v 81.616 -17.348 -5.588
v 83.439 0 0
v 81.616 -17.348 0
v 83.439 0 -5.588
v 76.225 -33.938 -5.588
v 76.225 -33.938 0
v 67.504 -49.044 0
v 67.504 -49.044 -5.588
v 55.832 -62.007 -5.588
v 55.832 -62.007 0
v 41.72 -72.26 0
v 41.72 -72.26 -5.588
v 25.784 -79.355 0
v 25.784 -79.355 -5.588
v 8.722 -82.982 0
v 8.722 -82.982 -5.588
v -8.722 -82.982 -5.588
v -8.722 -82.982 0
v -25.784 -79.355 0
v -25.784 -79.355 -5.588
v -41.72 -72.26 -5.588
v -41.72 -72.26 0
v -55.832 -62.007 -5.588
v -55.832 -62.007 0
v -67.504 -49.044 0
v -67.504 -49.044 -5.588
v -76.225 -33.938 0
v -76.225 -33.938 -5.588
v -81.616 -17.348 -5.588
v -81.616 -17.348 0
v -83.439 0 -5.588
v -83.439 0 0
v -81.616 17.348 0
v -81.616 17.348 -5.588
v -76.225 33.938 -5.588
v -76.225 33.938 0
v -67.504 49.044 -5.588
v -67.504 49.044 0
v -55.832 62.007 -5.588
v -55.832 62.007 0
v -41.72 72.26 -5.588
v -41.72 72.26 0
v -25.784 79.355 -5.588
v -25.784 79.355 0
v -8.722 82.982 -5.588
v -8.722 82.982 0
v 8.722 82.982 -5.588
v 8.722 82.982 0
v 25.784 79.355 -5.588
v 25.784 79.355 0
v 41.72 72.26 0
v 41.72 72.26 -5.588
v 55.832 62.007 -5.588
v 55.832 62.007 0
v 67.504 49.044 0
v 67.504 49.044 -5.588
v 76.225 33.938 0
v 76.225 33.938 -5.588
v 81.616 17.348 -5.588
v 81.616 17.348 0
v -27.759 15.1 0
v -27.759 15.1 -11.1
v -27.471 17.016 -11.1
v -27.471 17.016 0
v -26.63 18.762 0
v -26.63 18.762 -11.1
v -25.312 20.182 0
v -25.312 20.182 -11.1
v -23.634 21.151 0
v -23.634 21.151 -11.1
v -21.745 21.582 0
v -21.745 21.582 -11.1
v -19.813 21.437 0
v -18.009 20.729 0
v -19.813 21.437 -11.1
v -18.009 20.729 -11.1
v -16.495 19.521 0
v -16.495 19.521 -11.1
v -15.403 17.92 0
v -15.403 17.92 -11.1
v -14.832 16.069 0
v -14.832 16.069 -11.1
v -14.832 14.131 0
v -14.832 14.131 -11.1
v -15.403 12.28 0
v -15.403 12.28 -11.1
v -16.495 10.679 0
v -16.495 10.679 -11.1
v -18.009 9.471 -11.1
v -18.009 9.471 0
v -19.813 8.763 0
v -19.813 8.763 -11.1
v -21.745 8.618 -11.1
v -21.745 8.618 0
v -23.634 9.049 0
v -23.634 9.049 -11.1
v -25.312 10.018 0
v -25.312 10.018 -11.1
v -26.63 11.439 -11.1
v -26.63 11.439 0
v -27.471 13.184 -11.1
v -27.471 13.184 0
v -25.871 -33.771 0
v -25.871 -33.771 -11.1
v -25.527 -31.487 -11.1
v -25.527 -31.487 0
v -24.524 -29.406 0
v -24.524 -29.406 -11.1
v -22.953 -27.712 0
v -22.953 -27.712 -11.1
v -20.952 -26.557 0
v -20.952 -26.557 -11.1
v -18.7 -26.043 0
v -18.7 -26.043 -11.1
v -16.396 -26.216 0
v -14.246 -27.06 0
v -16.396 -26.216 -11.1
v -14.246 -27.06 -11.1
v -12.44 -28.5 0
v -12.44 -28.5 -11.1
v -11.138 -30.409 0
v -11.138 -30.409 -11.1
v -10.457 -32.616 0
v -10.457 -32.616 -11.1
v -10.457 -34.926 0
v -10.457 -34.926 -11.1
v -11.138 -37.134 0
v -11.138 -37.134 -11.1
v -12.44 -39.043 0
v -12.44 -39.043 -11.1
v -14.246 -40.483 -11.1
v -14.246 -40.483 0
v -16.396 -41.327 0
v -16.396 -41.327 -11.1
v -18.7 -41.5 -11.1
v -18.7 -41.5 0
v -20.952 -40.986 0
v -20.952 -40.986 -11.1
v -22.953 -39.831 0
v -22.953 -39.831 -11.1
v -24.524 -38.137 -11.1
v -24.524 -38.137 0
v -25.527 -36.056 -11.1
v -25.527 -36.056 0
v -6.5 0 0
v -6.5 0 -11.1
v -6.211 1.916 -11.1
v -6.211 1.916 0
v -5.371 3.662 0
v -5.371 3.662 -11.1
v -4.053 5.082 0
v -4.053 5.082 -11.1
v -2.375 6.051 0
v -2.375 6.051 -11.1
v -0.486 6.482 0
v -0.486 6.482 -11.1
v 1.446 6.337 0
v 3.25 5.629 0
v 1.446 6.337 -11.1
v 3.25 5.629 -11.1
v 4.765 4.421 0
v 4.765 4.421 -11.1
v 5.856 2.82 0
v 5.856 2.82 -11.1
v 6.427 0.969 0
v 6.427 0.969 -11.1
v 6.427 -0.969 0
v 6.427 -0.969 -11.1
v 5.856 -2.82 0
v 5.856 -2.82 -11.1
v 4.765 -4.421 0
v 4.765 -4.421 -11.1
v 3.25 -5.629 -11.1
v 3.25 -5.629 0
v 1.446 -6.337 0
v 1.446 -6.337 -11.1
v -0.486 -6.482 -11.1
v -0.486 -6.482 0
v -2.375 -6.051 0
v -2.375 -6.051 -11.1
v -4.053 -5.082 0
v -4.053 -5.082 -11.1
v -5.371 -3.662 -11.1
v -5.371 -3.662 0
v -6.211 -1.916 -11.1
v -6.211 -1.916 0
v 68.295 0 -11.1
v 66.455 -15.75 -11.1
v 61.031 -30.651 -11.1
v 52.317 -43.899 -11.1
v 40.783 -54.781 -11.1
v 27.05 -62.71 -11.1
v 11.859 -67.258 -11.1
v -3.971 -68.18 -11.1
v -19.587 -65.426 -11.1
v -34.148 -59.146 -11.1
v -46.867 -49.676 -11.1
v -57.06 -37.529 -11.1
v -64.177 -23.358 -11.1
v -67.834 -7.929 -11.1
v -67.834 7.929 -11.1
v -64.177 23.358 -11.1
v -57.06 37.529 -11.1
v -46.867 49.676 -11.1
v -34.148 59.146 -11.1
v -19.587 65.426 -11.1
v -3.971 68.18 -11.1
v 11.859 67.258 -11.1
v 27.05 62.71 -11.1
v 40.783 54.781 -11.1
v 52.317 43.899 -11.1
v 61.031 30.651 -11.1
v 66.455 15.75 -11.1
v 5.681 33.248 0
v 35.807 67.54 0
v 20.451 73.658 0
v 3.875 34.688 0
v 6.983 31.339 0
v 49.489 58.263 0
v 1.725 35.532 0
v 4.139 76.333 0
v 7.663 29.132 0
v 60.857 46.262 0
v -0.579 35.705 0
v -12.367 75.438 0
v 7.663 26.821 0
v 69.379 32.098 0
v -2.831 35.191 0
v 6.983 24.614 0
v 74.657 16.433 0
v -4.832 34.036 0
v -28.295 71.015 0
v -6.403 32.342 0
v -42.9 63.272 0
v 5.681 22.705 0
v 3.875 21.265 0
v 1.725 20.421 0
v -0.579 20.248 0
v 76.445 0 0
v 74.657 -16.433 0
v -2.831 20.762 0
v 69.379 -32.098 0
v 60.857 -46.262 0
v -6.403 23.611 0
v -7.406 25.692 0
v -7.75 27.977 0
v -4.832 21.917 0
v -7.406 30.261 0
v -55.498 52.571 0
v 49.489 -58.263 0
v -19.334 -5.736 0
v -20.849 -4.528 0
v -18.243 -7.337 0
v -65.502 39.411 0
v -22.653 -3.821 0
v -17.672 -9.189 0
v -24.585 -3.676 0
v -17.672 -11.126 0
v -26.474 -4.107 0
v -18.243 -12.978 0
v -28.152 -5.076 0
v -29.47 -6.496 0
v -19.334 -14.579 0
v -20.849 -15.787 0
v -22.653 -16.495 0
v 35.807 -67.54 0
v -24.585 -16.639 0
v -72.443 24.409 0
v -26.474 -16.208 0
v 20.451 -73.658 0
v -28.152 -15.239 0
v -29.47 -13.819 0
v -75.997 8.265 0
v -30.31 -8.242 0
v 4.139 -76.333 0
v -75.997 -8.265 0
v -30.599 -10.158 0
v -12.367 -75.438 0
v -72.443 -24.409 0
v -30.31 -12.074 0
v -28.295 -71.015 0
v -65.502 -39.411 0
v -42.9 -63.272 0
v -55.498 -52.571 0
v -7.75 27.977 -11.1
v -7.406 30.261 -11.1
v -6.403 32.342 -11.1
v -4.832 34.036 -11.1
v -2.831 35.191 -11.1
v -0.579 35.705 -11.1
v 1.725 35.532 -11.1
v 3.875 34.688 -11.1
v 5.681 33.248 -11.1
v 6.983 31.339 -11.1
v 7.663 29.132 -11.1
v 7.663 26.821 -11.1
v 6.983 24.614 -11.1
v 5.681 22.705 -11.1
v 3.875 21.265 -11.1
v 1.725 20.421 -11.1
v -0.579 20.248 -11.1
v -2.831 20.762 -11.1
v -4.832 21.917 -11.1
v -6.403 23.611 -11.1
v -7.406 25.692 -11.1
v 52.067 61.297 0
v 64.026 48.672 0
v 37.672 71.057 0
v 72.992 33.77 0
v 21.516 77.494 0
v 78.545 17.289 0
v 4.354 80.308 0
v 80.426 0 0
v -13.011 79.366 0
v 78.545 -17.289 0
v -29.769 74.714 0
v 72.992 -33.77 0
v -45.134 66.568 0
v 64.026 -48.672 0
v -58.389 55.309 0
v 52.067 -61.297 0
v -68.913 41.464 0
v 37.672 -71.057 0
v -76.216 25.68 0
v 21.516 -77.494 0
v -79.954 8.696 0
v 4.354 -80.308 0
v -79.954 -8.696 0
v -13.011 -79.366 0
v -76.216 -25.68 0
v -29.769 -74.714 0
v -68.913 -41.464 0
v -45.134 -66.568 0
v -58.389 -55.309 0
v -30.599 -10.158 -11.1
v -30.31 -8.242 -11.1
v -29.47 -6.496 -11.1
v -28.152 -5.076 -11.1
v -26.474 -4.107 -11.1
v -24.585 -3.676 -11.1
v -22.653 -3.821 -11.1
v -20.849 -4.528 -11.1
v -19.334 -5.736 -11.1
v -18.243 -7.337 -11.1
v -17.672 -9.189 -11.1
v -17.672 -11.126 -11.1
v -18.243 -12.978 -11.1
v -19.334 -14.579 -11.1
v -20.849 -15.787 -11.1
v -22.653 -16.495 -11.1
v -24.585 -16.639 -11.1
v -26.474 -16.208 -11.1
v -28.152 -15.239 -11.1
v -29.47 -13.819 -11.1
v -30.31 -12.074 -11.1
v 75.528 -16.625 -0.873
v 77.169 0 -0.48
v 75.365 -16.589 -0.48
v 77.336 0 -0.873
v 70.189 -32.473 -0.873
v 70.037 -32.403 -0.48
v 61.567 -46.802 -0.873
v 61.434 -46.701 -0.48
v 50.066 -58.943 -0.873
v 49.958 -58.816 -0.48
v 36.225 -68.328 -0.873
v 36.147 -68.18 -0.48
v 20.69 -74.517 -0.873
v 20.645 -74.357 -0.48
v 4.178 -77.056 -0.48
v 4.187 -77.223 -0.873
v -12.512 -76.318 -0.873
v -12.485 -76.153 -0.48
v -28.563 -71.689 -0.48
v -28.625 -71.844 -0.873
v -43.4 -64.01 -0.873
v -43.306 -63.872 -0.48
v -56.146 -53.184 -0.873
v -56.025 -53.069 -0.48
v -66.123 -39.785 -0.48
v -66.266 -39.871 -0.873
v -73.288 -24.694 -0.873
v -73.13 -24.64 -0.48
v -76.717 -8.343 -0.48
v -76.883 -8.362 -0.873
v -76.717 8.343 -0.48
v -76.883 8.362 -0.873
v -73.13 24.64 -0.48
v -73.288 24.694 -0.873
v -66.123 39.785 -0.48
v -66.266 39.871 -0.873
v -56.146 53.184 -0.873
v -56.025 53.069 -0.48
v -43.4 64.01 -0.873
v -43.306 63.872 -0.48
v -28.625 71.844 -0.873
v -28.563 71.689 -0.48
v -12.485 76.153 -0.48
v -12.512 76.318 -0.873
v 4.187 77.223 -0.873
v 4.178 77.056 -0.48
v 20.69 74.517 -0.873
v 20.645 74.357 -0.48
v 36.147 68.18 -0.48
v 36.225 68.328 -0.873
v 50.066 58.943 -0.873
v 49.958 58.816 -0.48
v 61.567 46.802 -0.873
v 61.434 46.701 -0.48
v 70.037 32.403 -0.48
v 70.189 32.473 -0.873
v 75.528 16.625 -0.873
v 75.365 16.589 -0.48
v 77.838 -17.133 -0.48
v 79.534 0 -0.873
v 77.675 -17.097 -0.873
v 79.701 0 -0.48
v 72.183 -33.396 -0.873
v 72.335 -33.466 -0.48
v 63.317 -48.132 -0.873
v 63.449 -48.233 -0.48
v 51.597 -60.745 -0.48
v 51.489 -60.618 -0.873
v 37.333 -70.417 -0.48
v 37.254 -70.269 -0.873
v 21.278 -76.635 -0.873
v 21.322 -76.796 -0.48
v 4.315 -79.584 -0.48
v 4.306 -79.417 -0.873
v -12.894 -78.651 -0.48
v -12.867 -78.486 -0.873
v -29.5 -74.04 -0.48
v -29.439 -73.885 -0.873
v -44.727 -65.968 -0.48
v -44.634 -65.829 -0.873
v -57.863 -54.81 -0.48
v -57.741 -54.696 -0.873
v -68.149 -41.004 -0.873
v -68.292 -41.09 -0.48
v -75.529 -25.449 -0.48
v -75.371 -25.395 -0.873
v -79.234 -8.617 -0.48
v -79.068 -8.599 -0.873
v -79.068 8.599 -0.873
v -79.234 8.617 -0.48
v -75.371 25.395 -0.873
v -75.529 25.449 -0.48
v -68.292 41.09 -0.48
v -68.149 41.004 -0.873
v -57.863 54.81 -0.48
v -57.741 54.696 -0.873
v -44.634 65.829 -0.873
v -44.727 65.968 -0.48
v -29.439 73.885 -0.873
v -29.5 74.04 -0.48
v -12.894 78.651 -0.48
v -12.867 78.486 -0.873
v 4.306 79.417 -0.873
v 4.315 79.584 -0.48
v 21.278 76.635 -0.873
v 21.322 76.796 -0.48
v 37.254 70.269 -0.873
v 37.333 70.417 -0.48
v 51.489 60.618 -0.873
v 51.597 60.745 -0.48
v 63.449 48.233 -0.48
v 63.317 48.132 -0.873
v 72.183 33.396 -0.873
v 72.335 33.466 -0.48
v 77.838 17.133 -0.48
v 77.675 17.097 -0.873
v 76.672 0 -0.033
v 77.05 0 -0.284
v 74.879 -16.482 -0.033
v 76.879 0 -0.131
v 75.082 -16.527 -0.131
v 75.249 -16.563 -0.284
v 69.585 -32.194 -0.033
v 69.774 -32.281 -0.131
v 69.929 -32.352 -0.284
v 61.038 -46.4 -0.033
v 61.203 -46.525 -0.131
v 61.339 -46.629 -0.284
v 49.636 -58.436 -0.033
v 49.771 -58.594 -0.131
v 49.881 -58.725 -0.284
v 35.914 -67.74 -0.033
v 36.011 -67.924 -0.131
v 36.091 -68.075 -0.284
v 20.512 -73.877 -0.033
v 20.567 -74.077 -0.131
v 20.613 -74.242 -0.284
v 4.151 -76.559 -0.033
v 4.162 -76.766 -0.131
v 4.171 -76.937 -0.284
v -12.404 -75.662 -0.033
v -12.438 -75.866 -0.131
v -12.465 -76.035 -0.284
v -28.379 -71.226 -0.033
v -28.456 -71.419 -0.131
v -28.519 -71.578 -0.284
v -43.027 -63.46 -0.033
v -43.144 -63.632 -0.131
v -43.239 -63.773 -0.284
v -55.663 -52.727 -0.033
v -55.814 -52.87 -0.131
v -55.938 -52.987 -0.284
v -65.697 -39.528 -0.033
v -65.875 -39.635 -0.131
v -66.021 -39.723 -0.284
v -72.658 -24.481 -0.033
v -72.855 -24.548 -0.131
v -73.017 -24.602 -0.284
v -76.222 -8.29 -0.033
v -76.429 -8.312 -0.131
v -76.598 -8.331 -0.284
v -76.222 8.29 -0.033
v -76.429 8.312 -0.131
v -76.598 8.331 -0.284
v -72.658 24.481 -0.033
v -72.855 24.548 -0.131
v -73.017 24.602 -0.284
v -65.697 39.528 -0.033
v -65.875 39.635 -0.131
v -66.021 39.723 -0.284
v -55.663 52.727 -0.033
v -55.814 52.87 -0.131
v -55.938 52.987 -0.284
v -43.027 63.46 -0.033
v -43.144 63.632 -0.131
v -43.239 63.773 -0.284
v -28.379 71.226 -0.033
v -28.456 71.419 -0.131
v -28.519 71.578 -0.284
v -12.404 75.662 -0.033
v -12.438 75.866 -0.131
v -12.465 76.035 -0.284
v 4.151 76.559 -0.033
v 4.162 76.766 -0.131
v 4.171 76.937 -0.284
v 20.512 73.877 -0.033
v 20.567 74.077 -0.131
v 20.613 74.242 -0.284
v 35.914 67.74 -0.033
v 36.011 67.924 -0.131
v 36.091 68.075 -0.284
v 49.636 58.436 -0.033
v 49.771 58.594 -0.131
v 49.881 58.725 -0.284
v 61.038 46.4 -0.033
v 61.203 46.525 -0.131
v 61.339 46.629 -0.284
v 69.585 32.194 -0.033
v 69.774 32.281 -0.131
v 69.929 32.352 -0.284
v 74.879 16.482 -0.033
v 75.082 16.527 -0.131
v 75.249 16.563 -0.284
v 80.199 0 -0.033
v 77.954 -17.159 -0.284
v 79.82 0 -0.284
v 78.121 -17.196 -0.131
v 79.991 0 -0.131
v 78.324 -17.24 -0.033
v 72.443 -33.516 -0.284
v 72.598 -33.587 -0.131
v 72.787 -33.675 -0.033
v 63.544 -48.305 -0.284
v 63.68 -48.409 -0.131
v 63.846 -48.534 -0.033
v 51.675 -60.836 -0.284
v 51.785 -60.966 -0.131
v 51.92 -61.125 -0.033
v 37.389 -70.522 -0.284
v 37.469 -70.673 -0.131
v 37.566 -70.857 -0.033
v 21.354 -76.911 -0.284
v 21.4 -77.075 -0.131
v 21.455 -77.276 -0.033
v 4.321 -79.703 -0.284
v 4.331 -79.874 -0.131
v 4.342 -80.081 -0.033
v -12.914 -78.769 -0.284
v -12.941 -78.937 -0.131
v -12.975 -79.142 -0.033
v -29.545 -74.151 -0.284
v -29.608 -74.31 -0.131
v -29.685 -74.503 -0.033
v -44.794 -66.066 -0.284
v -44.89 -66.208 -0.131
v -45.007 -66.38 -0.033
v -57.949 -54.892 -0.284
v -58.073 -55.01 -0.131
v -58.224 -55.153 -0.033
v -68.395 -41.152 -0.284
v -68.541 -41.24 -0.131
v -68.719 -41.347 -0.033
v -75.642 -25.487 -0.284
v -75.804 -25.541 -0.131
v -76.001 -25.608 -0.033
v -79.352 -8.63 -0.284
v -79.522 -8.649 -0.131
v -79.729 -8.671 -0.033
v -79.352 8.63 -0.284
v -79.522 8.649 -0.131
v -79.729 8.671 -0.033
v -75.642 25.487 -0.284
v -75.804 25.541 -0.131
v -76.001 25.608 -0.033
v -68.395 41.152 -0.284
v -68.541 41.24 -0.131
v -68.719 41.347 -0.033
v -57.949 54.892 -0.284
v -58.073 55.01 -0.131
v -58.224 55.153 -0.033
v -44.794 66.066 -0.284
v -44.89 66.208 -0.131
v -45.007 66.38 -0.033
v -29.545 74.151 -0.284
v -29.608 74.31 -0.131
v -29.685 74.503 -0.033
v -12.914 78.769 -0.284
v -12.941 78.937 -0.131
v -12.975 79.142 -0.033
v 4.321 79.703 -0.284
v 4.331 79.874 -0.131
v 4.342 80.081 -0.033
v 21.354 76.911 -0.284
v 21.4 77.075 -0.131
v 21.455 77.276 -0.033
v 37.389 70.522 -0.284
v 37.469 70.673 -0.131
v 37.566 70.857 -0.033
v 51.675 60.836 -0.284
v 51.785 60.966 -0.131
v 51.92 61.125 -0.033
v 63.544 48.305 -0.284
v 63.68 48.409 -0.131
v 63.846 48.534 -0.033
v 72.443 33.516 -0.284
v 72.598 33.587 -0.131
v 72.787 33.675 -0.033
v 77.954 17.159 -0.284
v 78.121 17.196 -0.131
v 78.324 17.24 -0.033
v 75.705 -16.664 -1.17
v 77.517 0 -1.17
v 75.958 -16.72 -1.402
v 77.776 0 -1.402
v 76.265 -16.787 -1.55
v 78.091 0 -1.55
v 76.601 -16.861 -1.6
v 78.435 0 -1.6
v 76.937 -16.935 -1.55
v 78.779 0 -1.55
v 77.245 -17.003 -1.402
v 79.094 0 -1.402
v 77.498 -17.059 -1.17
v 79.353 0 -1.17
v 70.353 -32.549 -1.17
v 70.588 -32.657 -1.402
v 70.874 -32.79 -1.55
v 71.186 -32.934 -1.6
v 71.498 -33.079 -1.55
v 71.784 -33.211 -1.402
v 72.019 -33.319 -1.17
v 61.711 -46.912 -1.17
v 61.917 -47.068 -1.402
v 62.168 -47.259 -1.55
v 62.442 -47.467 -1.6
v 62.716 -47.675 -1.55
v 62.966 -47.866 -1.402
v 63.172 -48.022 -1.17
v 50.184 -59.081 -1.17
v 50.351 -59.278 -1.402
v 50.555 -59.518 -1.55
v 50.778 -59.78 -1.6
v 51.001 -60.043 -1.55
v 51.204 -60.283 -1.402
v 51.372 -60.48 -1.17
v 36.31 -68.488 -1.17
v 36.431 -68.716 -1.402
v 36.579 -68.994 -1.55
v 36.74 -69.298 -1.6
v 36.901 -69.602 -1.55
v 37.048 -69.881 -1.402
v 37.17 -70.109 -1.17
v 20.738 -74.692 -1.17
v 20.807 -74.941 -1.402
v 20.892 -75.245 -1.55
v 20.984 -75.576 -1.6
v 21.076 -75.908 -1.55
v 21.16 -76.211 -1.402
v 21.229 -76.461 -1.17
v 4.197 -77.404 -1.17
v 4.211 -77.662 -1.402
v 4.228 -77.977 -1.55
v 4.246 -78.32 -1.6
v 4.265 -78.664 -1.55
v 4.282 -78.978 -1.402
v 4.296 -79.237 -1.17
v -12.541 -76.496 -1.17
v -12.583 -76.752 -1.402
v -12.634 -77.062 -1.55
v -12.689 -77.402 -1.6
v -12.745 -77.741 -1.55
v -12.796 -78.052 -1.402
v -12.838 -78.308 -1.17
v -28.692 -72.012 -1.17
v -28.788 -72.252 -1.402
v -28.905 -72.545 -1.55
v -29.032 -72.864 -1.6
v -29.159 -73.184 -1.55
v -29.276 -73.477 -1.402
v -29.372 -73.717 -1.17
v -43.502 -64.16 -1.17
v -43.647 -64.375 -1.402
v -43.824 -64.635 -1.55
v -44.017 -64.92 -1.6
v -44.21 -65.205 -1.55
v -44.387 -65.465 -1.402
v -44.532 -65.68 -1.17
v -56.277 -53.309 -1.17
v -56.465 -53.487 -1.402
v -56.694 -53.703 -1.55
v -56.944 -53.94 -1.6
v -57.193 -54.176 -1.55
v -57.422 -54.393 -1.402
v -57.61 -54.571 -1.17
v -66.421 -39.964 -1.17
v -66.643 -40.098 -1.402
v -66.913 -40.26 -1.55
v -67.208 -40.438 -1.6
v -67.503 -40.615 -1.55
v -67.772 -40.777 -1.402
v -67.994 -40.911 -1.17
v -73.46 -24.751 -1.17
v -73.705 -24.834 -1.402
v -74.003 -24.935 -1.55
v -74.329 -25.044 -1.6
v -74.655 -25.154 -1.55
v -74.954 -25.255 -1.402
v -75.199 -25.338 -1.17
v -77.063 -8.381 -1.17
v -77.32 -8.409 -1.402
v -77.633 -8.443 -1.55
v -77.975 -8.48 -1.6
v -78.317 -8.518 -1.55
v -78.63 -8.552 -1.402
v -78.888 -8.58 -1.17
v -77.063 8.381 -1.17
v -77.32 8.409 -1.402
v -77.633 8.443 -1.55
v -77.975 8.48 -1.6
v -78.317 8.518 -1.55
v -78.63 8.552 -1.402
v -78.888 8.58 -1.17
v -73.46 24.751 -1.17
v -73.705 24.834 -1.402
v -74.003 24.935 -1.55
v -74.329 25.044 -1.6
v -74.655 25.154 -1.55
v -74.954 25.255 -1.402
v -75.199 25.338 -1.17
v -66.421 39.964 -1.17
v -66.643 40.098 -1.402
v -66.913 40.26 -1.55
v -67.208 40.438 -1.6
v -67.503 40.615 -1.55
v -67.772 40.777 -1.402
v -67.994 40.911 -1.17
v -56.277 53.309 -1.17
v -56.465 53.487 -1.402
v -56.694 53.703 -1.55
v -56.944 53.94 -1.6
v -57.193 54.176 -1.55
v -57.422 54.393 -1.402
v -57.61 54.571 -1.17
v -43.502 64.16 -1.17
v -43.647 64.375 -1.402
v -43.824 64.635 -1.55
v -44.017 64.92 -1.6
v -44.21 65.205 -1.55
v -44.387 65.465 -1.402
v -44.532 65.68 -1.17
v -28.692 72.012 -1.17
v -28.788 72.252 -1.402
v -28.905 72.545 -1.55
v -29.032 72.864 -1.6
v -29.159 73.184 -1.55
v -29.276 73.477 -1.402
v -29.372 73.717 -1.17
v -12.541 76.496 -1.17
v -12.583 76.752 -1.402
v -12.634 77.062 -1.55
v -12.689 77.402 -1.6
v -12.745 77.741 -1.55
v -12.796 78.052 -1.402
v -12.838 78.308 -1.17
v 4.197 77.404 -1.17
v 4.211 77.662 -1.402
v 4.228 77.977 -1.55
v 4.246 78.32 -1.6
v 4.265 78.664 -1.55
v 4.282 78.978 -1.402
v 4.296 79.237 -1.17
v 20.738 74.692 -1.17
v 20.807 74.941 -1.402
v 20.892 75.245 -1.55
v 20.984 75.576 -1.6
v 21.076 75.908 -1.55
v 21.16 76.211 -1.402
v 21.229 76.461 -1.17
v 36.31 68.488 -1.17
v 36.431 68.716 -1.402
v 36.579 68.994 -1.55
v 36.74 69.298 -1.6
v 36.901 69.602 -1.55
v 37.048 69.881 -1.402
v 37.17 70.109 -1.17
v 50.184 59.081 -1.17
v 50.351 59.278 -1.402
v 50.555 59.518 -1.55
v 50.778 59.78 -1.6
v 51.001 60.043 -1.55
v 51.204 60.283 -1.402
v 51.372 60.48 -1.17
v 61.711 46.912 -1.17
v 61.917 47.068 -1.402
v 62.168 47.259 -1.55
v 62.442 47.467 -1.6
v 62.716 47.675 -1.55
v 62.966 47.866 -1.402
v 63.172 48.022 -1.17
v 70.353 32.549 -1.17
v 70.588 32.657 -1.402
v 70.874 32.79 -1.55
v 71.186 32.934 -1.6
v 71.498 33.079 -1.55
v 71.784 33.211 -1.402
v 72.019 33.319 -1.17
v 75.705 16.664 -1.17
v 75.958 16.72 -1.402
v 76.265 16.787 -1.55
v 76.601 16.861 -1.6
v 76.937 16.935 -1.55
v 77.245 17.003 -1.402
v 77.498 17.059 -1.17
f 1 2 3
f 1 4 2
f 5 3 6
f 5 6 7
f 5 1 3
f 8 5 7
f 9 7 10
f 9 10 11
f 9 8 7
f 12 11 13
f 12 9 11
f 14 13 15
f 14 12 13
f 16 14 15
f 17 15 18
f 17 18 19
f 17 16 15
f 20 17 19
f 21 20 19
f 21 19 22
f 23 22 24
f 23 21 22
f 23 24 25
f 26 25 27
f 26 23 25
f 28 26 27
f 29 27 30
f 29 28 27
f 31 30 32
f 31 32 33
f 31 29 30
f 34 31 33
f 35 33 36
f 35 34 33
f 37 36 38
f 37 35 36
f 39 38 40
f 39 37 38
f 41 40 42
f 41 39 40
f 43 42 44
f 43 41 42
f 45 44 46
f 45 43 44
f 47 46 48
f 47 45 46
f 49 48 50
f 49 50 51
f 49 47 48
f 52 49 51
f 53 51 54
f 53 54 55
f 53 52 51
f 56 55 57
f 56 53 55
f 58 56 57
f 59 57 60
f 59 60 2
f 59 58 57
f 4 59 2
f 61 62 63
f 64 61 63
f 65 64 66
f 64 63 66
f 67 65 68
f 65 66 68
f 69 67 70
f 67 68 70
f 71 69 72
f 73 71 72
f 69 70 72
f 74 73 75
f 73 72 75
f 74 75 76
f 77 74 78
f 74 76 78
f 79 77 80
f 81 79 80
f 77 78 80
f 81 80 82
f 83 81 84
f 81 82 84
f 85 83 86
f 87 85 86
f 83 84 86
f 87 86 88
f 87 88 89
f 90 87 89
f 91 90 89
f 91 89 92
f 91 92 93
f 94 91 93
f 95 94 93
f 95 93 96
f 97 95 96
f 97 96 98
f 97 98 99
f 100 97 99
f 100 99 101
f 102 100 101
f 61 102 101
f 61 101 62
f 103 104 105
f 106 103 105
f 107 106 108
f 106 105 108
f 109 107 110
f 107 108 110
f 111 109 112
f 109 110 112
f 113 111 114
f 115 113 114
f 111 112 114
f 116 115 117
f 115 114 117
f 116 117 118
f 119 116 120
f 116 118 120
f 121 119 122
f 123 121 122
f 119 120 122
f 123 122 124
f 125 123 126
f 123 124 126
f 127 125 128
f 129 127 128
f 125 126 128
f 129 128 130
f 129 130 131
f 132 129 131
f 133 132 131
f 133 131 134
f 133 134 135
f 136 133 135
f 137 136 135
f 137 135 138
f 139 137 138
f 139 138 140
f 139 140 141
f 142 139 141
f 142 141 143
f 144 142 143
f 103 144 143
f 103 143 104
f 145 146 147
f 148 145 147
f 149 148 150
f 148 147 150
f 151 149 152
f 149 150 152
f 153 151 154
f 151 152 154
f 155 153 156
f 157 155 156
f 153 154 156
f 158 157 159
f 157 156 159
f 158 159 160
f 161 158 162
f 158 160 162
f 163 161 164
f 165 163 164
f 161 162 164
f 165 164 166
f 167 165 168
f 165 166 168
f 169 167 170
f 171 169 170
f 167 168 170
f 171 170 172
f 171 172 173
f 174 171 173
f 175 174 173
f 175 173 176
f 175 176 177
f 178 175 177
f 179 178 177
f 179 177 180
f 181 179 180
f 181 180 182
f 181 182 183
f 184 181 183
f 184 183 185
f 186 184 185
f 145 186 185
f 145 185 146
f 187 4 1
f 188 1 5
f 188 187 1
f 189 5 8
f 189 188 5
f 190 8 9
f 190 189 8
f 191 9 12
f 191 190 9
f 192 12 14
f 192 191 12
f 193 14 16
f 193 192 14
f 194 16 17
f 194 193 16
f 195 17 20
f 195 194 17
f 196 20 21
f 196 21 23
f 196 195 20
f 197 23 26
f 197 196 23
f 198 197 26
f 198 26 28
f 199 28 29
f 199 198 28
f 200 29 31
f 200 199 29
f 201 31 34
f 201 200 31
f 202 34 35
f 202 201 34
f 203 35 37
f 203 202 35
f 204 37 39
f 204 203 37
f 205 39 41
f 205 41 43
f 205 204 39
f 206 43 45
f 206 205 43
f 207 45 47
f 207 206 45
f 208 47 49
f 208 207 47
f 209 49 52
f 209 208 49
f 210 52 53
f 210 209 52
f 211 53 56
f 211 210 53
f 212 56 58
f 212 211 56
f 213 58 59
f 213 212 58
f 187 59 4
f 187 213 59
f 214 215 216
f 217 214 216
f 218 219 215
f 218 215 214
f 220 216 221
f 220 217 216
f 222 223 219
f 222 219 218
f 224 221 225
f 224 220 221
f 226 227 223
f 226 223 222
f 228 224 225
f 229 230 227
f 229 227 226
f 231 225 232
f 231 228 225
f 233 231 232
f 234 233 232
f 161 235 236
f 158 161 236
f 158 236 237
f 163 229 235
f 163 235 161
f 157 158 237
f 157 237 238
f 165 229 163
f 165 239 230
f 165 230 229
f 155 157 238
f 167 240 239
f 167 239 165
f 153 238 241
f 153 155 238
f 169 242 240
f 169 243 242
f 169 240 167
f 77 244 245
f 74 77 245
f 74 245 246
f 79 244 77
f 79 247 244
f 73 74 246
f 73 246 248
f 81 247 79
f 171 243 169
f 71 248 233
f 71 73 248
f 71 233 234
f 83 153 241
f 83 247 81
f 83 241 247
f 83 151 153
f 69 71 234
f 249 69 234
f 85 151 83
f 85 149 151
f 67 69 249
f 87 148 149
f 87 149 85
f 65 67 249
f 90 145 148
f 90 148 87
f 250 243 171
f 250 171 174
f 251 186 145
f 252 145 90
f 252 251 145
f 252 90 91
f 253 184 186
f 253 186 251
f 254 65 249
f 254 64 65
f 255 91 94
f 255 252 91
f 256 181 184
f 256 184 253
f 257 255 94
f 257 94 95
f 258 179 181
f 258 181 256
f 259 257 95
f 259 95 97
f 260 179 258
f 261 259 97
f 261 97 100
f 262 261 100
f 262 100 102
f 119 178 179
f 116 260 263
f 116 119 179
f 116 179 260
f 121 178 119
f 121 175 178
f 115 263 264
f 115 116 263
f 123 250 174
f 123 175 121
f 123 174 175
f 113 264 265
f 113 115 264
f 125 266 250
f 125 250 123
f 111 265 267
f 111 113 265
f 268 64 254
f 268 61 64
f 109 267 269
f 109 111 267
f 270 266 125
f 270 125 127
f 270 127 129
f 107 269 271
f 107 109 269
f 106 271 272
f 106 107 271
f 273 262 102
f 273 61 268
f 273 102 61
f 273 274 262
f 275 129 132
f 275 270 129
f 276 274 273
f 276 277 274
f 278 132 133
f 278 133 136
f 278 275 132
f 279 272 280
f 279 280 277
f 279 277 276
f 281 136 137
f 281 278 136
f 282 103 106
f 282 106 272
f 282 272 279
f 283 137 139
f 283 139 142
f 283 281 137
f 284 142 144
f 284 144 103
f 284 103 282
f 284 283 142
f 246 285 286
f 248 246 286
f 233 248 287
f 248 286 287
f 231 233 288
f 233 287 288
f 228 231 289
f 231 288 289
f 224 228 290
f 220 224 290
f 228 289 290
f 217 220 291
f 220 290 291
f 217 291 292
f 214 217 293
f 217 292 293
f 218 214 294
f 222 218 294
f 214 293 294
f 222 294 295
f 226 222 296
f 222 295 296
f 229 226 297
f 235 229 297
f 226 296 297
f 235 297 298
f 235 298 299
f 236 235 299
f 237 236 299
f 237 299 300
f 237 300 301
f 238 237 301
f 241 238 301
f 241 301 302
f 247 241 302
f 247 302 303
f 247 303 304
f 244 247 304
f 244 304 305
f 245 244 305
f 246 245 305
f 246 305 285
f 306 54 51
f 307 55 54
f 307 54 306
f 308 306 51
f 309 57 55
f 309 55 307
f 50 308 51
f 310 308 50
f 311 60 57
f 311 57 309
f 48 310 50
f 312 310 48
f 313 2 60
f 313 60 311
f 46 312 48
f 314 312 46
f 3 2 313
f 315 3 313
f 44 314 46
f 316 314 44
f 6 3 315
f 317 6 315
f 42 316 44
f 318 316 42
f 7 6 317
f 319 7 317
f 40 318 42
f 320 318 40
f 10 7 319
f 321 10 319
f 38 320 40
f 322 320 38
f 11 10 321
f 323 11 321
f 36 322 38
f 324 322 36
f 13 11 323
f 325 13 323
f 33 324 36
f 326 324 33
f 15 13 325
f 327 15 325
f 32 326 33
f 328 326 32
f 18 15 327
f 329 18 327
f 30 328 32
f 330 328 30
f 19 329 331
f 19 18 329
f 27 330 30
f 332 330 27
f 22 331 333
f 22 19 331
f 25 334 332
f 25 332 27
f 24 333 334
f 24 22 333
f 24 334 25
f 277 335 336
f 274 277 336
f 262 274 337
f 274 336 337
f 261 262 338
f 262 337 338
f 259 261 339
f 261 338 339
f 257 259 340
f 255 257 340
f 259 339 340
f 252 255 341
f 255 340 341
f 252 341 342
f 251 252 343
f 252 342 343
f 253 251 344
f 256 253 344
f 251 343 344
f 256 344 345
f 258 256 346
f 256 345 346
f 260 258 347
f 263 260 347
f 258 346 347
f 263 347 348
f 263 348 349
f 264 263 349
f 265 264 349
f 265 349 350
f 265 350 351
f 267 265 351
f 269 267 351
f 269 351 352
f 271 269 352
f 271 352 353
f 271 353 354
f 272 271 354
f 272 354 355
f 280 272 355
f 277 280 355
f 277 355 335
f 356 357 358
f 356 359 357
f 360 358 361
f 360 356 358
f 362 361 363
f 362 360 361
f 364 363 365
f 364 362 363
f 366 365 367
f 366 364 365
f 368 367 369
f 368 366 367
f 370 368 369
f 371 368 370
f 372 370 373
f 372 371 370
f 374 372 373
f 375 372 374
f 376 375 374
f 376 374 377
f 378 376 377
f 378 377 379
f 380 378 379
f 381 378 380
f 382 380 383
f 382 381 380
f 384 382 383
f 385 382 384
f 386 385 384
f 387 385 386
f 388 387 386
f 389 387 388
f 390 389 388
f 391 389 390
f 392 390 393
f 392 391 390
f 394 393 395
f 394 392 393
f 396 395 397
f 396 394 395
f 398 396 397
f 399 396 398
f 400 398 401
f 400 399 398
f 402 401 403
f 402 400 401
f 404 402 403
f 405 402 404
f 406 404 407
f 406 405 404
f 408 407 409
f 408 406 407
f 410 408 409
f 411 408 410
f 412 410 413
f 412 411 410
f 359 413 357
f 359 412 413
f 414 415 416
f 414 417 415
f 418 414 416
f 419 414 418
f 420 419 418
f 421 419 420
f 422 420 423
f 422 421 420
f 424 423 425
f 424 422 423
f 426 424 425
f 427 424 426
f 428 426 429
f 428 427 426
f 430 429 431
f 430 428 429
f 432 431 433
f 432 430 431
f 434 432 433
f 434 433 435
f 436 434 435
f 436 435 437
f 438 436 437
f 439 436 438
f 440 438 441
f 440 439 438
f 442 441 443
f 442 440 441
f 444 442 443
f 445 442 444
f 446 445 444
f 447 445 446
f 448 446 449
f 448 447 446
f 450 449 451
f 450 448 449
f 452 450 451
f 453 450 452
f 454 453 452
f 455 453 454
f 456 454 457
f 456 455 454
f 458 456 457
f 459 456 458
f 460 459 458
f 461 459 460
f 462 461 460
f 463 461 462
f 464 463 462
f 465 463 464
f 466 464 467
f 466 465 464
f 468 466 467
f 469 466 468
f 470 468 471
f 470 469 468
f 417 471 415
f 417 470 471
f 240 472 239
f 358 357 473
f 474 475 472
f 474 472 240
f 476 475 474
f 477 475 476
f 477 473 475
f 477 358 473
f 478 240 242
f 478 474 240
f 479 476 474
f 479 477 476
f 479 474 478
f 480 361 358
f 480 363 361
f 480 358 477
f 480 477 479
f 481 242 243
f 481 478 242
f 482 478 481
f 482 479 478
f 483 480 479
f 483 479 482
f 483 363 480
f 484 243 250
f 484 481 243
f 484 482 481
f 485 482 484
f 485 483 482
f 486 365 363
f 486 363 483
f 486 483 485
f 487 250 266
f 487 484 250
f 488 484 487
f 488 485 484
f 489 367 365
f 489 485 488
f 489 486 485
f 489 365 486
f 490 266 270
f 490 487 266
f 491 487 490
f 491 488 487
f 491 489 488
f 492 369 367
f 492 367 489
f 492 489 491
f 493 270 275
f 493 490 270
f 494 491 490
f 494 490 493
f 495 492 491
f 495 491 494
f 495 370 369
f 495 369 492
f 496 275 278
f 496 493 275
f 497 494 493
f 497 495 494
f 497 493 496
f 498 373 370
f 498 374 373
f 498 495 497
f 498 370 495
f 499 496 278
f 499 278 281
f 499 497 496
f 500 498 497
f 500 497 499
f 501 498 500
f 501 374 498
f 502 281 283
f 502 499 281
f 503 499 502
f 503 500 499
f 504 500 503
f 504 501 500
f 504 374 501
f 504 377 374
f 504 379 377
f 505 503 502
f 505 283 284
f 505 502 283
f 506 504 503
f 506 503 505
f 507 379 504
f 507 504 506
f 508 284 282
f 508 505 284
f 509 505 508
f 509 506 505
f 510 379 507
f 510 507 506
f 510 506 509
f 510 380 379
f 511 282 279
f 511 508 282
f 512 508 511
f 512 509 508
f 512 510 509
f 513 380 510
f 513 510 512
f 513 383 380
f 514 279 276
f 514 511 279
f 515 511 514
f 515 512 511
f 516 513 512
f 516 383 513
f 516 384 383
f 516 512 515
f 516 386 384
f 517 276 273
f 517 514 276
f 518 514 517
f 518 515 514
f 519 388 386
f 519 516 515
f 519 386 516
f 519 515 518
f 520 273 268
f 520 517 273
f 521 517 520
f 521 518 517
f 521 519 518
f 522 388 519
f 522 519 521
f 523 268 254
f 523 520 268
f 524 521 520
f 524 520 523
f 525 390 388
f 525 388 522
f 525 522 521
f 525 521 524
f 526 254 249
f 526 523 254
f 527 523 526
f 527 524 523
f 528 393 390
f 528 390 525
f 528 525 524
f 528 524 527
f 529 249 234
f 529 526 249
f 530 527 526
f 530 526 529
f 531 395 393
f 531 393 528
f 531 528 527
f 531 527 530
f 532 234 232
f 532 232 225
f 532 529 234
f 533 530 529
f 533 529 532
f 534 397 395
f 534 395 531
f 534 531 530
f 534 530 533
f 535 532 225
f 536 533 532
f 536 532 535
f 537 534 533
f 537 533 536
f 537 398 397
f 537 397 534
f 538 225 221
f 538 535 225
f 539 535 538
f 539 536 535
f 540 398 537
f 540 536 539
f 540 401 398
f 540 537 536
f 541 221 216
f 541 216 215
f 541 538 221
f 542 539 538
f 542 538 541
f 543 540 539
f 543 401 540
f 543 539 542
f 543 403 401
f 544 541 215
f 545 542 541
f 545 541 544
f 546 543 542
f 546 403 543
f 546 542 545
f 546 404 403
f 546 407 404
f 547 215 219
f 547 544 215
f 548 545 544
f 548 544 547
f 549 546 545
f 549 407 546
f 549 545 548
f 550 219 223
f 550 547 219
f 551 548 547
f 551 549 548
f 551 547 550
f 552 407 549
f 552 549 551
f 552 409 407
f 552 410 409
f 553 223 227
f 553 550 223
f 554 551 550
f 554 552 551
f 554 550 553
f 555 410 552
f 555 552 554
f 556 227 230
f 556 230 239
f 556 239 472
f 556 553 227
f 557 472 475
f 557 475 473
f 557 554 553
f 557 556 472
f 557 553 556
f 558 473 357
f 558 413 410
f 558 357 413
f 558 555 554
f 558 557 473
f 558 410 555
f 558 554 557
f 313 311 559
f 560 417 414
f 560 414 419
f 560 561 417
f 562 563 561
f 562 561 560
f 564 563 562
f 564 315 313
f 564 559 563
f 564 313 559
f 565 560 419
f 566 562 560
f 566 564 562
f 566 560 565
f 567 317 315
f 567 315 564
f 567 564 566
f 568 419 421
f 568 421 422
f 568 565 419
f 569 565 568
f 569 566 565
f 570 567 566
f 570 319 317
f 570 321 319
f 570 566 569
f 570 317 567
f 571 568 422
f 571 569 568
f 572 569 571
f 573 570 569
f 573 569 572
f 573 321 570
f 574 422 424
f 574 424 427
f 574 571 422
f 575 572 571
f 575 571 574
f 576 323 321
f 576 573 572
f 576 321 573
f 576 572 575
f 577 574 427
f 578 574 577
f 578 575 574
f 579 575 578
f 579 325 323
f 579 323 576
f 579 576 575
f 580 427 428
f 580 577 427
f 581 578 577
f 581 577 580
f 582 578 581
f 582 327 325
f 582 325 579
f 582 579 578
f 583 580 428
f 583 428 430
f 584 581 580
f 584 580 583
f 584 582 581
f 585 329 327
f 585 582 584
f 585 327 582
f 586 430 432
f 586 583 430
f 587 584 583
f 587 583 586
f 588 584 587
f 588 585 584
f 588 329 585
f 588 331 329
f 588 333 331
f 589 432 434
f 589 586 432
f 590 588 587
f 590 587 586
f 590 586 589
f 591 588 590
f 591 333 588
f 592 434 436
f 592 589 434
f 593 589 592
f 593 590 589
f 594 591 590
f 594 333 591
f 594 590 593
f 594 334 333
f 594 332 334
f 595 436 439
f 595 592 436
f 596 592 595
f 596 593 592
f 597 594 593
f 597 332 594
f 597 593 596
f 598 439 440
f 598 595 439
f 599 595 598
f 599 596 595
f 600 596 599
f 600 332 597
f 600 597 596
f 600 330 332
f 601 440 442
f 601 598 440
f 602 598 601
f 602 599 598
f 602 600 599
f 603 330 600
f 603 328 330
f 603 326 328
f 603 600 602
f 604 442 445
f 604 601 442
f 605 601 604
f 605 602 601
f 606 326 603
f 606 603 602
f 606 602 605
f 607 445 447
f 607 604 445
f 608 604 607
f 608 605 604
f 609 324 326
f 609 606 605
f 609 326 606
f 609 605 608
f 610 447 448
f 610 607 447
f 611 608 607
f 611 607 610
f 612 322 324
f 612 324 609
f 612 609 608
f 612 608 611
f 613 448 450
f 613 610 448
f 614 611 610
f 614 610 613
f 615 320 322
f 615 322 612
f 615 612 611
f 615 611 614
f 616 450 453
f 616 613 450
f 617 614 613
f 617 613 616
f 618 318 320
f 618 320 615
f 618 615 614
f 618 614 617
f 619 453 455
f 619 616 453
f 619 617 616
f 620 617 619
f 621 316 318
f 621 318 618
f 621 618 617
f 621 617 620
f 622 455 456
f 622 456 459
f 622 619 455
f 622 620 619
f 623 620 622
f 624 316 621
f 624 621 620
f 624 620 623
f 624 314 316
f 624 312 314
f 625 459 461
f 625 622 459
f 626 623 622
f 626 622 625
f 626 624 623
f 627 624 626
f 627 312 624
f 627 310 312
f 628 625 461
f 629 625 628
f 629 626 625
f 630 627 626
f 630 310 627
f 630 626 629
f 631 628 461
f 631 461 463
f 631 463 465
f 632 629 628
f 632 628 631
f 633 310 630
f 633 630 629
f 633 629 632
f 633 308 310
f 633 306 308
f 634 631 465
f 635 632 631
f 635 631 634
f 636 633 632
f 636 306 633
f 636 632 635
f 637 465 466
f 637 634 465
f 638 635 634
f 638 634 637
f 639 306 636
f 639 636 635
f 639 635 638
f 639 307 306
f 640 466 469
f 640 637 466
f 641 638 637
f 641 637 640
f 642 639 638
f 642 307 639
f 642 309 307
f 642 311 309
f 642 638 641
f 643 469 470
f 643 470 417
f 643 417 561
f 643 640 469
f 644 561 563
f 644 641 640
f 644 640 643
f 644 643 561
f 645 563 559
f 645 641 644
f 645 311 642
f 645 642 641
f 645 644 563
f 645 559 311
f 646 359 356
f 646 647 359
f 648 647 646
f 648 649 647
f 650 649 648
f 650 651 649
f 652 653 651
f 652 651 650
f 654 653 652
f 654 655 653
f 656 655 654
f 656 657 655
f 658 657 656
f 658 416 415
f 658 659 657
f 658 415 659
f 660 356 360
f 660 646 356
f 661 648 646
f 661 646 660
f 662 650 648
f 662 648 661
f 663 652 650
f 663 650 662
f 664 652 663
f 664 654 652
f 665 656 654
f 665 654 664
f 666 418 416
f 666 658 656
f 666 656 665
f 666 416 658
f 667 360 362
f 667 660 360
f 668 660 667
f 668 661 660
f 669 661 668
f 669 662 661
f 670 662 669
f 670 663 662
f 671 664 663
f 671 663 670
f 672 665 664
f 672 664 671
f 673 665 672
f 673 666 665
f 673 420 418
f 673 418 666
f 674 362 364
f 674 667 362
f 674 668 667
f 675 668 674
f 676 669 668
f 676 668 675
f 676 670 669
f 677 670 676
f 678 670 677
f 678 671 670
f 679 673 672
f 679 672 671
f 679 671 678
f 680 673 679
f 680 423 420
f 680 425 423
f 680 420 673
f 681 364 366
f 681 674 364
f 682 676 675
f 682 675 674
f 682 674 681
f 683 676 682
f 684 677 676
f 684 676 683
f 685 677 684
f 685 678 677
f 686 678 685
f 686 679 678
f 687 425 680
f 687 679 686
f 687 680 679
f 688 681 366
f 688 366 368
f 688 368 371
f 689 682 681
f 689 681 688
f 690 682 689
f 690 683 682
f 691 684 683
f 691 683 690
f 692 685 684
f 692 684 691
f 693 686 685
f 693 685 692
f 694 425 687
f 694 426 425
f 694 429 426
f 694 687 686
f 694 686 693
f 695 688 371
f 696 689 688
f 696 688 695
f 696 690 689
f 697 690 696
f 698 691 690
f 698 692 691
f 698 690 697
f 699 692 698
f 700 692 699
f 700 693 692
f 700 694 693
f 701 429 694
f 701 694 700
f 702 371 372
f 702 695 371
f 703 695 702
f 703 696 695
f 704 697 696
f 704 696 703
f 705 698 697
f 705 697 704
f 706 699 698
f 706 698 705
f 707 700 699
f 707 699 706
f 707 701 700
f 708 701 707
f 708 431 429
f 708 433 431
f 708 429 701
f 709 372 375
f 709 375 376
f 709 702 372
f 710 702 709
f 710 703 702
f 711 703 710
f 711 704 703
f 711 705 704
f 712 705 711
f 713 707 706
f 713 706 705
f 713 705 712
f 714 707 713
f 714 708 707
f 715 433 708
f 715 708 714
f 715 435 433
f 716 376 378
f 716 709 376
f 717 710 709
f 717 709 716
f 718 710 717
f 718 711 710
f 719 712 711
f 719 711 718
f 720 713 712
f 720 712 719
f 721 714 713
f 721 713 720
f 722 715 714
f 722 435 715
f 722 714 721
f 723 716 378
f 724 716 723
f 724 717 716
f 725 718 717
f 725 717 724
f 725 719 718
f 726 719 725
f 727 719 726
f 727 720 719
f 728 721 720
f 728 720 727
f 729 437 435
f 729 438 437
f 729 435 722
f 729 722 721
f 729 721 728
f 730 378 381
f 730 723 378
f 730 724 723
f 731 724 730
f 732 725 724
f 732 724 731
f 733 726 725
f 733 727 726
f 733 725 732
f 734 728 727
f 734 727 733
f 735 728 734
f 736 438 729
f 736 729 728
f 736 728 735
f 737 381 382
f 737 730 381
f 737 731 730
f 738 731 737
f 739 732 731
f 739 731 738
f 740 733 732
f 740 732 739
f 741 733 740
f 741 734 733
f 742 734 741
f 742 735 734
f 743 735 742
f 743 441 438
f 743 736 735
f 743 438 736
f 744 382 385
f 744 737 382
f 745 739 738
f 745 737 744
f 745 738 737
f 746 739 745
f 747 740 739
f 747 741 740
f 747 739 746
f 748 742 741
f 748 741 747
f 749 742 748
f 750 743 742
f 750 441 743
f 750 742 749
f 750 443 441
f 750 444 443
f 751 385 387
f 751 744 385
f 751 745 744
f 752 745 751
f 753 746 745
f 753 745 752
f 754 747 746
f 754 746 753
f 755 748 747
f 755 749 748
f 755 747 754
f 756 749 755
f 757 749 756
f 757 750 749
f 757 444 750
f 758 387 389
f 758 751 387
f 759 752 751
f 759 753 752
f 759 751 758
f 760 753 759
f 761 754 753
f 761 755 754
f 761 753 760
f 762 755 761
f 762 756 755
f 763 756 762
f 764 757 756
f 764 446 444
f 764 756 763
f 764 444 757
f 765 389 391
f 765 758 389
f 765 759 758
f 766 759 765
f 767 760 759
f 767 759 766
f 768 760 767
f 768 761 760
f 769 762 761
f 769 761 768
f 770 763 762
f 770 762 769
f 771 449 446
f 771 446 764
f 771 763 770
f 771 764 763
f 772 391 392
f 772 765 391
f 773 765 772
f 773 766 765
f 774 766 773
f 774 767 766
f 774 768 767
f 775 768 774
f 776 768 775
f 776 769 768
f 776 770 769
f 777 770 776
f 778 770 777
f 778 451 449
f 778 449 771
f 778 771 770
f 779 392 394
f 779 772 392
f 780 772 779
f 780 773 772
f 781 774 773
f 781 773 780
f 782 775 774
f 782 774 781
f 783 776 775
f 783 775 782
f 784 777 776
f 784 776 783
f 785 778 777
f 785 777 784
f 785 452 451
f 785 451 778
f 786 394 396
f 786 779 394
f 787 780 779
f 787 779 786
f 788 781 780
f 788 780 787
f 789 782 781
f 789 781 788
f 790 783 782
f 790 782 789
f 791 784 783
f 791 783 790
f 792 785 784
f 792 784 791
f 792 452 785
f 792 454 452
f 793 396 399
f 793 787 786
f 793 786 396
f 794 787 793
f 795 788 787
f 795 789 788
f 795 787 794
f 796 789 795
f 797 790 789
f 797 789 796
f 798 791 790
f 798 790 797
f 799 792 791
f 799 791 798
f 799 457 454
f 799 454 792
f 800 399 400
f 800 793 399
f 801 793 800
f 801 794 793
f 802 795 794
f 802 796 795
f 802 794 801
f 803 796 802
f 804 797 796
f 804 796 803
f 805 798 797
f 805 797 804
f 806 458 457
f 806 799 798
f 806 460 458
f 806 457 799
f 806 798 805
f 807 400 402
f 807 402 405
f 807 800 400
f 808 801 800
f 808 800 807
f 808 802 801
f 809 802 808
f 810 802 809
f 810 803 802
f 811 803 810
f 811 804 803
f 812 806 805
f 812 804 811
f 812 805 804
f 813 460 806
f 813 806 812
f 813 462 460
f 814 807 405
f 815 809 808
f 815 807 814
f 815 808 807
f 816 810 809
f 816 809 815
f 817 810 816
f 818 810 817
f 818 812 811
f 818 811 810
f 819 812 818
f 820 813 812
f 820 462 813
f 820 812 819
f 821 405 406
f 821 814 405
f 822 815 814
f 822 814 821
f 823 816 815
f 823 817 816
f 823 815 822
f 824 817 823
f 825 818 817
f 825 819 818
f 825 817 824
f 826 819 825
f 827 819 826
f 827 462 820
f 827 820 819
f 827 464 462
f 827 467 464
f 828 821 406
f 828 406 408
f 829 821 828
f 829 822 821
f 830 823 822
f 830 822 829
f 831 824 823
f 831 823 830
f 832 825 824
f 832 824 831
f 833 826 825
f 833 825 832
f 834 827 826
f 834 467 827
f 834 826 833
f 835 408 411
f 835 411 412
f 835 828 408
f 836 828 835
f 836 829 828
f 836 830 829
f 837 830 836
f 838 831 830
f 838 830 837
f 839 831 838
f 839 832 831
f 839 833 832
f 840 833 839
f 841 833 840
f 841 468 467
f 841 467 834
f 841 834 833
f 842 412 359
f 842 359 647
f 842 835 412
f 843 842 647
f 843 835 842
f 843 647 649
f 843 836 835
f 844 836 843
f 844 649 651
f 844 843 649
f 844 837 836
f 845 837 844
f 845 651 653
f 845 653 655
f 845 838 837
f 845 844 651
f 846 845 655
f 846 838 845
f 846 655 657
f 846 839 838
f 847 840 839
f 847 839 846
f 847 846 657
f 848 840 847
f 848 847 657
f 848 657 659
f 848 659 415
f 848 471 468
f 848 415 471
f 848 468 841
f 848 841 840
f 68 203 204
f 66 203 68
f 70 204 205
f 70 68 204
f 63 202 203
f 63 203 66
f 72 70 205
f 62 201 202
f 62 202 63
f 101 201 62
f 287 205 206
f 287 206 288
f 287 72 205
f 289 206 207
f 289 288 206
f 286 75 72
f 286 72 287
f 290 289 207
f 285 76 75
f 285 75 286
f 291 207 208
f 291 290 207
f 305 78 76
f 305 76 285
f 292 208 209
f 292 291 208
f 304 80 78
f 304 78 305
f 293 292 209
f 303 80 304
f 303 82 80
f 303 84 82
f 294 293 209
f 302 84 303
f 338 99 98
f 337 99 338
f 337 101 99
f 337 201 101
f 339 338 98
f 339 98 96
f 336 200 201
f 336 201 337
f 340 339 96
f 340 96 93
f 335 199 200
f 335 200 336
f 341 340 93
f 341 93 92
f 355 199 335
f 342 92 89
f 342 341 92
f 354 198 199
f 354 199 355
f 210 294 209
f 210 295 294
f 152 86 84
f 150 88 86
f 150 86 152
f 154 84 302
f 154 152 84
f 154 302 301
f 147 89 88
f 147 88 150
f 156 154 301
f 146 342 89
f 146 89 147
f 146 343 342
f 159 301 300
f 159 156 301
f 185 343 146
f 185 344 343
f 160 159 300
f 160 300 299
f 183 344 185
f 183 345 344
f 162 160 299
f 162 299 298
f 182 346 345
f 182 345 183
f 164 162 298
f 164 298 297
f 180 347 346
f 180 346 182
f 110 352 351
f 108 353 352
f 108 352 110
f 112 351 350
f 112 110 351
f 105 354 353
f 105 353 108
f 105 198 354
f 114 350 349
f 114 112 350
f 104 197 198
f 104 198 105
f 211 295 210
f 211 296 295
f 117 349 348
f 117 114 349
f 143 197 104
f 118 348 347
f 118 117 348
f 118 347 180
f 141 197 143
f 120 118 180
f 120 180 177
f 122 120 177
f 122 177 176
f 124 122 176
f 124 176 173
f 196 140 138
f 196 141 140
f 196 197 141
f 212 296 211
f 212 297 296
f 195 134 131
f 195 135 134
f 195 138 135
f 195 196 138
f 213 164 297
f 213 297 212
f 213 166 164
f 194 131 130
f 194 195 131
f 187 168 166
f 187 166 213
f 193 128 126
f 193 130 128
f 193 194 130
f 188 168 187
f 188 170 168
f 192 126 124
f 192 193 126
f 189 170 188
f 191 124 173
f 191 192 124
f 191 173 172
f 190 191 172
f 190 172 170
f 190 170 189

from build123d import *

# Parameters (mm, degrees)
SKETCH2_R          = 6.5
SKETCH2_R_2        = 7.75
CUT_EXTRUDE1_DEPTH = 119.521470637


with BuildPart() as part:
    # Sketch1 → Revolve1 (revolve)
    with BuildSketch(Plane(origin=(0, 0, 0), x_dir=(0, 0, -1), z_dir=(1, 0, 0)), mode=Mode.PRIVATE) as revolve1_sk:
        with BuildLine():
            Line((0, 0), (0, 76.444627725))
            ThreePointArc((0, 76.444627725), (0.130798304, 76.879222907), (0.479738309, 77.169433247))
            Line((0.479738309, 77.169433247), (0.872854821, 77.336301306))
            ThreePointArc((0.872854821, 77.336301306), (1.6002, 78.4352), (0.872854821, 79.534098694))
            Line((0.872854821, 79.534098694), (0.479738309, 79.700966753))
            ThreePointArc((0.479738309, 79.700966753), (0.130798304, 79.991177093), (0, 80.425772275))
            Line((0, 80.425772275), (0, 83.439))
            Line((0, 83.439), (5.588, 83.439))
            Line((5.588, 83.439), (11.0998, 68.295453959))
            Line((11.0998, 68.295453959), (11.0998, 0))
            Line((11.0998, 0), (0, 0))
        make_face()
    revolve(revolve1_sk.sketch.rotate(Axis((0, 0, 0), (0, 0, -1)), 90), axis=Axis((0, 0, 0), (0, 0, -1)))

    # Sketch2 → Cut-Extrude1 (cut, through all)
    with BuildSketch(Plane(origin=(0, 0, -11.0998), x_dir=(-1, 0, 0), z_dir=(0, 0, -1))):
        Circle(SKETCH2_R)
        with Locations((0, 27.9765569)):
            Circle(SKETCH2_R_2)
        with Locations((24.098999837, -10.15759269)):
            Circle(SKETCH2_R)
        with Locations((21.259374059, 15.100131331)):
            Circle(SKETCH2_R)
        with Locations((18.120840305, -33.771322839)):
            Circle(SKETCH2_R_2)
    extrude(amount=-CUT_EXTRUDE1_DEPTH, mode=Mode.SUBTRACT)


solid = part.part
